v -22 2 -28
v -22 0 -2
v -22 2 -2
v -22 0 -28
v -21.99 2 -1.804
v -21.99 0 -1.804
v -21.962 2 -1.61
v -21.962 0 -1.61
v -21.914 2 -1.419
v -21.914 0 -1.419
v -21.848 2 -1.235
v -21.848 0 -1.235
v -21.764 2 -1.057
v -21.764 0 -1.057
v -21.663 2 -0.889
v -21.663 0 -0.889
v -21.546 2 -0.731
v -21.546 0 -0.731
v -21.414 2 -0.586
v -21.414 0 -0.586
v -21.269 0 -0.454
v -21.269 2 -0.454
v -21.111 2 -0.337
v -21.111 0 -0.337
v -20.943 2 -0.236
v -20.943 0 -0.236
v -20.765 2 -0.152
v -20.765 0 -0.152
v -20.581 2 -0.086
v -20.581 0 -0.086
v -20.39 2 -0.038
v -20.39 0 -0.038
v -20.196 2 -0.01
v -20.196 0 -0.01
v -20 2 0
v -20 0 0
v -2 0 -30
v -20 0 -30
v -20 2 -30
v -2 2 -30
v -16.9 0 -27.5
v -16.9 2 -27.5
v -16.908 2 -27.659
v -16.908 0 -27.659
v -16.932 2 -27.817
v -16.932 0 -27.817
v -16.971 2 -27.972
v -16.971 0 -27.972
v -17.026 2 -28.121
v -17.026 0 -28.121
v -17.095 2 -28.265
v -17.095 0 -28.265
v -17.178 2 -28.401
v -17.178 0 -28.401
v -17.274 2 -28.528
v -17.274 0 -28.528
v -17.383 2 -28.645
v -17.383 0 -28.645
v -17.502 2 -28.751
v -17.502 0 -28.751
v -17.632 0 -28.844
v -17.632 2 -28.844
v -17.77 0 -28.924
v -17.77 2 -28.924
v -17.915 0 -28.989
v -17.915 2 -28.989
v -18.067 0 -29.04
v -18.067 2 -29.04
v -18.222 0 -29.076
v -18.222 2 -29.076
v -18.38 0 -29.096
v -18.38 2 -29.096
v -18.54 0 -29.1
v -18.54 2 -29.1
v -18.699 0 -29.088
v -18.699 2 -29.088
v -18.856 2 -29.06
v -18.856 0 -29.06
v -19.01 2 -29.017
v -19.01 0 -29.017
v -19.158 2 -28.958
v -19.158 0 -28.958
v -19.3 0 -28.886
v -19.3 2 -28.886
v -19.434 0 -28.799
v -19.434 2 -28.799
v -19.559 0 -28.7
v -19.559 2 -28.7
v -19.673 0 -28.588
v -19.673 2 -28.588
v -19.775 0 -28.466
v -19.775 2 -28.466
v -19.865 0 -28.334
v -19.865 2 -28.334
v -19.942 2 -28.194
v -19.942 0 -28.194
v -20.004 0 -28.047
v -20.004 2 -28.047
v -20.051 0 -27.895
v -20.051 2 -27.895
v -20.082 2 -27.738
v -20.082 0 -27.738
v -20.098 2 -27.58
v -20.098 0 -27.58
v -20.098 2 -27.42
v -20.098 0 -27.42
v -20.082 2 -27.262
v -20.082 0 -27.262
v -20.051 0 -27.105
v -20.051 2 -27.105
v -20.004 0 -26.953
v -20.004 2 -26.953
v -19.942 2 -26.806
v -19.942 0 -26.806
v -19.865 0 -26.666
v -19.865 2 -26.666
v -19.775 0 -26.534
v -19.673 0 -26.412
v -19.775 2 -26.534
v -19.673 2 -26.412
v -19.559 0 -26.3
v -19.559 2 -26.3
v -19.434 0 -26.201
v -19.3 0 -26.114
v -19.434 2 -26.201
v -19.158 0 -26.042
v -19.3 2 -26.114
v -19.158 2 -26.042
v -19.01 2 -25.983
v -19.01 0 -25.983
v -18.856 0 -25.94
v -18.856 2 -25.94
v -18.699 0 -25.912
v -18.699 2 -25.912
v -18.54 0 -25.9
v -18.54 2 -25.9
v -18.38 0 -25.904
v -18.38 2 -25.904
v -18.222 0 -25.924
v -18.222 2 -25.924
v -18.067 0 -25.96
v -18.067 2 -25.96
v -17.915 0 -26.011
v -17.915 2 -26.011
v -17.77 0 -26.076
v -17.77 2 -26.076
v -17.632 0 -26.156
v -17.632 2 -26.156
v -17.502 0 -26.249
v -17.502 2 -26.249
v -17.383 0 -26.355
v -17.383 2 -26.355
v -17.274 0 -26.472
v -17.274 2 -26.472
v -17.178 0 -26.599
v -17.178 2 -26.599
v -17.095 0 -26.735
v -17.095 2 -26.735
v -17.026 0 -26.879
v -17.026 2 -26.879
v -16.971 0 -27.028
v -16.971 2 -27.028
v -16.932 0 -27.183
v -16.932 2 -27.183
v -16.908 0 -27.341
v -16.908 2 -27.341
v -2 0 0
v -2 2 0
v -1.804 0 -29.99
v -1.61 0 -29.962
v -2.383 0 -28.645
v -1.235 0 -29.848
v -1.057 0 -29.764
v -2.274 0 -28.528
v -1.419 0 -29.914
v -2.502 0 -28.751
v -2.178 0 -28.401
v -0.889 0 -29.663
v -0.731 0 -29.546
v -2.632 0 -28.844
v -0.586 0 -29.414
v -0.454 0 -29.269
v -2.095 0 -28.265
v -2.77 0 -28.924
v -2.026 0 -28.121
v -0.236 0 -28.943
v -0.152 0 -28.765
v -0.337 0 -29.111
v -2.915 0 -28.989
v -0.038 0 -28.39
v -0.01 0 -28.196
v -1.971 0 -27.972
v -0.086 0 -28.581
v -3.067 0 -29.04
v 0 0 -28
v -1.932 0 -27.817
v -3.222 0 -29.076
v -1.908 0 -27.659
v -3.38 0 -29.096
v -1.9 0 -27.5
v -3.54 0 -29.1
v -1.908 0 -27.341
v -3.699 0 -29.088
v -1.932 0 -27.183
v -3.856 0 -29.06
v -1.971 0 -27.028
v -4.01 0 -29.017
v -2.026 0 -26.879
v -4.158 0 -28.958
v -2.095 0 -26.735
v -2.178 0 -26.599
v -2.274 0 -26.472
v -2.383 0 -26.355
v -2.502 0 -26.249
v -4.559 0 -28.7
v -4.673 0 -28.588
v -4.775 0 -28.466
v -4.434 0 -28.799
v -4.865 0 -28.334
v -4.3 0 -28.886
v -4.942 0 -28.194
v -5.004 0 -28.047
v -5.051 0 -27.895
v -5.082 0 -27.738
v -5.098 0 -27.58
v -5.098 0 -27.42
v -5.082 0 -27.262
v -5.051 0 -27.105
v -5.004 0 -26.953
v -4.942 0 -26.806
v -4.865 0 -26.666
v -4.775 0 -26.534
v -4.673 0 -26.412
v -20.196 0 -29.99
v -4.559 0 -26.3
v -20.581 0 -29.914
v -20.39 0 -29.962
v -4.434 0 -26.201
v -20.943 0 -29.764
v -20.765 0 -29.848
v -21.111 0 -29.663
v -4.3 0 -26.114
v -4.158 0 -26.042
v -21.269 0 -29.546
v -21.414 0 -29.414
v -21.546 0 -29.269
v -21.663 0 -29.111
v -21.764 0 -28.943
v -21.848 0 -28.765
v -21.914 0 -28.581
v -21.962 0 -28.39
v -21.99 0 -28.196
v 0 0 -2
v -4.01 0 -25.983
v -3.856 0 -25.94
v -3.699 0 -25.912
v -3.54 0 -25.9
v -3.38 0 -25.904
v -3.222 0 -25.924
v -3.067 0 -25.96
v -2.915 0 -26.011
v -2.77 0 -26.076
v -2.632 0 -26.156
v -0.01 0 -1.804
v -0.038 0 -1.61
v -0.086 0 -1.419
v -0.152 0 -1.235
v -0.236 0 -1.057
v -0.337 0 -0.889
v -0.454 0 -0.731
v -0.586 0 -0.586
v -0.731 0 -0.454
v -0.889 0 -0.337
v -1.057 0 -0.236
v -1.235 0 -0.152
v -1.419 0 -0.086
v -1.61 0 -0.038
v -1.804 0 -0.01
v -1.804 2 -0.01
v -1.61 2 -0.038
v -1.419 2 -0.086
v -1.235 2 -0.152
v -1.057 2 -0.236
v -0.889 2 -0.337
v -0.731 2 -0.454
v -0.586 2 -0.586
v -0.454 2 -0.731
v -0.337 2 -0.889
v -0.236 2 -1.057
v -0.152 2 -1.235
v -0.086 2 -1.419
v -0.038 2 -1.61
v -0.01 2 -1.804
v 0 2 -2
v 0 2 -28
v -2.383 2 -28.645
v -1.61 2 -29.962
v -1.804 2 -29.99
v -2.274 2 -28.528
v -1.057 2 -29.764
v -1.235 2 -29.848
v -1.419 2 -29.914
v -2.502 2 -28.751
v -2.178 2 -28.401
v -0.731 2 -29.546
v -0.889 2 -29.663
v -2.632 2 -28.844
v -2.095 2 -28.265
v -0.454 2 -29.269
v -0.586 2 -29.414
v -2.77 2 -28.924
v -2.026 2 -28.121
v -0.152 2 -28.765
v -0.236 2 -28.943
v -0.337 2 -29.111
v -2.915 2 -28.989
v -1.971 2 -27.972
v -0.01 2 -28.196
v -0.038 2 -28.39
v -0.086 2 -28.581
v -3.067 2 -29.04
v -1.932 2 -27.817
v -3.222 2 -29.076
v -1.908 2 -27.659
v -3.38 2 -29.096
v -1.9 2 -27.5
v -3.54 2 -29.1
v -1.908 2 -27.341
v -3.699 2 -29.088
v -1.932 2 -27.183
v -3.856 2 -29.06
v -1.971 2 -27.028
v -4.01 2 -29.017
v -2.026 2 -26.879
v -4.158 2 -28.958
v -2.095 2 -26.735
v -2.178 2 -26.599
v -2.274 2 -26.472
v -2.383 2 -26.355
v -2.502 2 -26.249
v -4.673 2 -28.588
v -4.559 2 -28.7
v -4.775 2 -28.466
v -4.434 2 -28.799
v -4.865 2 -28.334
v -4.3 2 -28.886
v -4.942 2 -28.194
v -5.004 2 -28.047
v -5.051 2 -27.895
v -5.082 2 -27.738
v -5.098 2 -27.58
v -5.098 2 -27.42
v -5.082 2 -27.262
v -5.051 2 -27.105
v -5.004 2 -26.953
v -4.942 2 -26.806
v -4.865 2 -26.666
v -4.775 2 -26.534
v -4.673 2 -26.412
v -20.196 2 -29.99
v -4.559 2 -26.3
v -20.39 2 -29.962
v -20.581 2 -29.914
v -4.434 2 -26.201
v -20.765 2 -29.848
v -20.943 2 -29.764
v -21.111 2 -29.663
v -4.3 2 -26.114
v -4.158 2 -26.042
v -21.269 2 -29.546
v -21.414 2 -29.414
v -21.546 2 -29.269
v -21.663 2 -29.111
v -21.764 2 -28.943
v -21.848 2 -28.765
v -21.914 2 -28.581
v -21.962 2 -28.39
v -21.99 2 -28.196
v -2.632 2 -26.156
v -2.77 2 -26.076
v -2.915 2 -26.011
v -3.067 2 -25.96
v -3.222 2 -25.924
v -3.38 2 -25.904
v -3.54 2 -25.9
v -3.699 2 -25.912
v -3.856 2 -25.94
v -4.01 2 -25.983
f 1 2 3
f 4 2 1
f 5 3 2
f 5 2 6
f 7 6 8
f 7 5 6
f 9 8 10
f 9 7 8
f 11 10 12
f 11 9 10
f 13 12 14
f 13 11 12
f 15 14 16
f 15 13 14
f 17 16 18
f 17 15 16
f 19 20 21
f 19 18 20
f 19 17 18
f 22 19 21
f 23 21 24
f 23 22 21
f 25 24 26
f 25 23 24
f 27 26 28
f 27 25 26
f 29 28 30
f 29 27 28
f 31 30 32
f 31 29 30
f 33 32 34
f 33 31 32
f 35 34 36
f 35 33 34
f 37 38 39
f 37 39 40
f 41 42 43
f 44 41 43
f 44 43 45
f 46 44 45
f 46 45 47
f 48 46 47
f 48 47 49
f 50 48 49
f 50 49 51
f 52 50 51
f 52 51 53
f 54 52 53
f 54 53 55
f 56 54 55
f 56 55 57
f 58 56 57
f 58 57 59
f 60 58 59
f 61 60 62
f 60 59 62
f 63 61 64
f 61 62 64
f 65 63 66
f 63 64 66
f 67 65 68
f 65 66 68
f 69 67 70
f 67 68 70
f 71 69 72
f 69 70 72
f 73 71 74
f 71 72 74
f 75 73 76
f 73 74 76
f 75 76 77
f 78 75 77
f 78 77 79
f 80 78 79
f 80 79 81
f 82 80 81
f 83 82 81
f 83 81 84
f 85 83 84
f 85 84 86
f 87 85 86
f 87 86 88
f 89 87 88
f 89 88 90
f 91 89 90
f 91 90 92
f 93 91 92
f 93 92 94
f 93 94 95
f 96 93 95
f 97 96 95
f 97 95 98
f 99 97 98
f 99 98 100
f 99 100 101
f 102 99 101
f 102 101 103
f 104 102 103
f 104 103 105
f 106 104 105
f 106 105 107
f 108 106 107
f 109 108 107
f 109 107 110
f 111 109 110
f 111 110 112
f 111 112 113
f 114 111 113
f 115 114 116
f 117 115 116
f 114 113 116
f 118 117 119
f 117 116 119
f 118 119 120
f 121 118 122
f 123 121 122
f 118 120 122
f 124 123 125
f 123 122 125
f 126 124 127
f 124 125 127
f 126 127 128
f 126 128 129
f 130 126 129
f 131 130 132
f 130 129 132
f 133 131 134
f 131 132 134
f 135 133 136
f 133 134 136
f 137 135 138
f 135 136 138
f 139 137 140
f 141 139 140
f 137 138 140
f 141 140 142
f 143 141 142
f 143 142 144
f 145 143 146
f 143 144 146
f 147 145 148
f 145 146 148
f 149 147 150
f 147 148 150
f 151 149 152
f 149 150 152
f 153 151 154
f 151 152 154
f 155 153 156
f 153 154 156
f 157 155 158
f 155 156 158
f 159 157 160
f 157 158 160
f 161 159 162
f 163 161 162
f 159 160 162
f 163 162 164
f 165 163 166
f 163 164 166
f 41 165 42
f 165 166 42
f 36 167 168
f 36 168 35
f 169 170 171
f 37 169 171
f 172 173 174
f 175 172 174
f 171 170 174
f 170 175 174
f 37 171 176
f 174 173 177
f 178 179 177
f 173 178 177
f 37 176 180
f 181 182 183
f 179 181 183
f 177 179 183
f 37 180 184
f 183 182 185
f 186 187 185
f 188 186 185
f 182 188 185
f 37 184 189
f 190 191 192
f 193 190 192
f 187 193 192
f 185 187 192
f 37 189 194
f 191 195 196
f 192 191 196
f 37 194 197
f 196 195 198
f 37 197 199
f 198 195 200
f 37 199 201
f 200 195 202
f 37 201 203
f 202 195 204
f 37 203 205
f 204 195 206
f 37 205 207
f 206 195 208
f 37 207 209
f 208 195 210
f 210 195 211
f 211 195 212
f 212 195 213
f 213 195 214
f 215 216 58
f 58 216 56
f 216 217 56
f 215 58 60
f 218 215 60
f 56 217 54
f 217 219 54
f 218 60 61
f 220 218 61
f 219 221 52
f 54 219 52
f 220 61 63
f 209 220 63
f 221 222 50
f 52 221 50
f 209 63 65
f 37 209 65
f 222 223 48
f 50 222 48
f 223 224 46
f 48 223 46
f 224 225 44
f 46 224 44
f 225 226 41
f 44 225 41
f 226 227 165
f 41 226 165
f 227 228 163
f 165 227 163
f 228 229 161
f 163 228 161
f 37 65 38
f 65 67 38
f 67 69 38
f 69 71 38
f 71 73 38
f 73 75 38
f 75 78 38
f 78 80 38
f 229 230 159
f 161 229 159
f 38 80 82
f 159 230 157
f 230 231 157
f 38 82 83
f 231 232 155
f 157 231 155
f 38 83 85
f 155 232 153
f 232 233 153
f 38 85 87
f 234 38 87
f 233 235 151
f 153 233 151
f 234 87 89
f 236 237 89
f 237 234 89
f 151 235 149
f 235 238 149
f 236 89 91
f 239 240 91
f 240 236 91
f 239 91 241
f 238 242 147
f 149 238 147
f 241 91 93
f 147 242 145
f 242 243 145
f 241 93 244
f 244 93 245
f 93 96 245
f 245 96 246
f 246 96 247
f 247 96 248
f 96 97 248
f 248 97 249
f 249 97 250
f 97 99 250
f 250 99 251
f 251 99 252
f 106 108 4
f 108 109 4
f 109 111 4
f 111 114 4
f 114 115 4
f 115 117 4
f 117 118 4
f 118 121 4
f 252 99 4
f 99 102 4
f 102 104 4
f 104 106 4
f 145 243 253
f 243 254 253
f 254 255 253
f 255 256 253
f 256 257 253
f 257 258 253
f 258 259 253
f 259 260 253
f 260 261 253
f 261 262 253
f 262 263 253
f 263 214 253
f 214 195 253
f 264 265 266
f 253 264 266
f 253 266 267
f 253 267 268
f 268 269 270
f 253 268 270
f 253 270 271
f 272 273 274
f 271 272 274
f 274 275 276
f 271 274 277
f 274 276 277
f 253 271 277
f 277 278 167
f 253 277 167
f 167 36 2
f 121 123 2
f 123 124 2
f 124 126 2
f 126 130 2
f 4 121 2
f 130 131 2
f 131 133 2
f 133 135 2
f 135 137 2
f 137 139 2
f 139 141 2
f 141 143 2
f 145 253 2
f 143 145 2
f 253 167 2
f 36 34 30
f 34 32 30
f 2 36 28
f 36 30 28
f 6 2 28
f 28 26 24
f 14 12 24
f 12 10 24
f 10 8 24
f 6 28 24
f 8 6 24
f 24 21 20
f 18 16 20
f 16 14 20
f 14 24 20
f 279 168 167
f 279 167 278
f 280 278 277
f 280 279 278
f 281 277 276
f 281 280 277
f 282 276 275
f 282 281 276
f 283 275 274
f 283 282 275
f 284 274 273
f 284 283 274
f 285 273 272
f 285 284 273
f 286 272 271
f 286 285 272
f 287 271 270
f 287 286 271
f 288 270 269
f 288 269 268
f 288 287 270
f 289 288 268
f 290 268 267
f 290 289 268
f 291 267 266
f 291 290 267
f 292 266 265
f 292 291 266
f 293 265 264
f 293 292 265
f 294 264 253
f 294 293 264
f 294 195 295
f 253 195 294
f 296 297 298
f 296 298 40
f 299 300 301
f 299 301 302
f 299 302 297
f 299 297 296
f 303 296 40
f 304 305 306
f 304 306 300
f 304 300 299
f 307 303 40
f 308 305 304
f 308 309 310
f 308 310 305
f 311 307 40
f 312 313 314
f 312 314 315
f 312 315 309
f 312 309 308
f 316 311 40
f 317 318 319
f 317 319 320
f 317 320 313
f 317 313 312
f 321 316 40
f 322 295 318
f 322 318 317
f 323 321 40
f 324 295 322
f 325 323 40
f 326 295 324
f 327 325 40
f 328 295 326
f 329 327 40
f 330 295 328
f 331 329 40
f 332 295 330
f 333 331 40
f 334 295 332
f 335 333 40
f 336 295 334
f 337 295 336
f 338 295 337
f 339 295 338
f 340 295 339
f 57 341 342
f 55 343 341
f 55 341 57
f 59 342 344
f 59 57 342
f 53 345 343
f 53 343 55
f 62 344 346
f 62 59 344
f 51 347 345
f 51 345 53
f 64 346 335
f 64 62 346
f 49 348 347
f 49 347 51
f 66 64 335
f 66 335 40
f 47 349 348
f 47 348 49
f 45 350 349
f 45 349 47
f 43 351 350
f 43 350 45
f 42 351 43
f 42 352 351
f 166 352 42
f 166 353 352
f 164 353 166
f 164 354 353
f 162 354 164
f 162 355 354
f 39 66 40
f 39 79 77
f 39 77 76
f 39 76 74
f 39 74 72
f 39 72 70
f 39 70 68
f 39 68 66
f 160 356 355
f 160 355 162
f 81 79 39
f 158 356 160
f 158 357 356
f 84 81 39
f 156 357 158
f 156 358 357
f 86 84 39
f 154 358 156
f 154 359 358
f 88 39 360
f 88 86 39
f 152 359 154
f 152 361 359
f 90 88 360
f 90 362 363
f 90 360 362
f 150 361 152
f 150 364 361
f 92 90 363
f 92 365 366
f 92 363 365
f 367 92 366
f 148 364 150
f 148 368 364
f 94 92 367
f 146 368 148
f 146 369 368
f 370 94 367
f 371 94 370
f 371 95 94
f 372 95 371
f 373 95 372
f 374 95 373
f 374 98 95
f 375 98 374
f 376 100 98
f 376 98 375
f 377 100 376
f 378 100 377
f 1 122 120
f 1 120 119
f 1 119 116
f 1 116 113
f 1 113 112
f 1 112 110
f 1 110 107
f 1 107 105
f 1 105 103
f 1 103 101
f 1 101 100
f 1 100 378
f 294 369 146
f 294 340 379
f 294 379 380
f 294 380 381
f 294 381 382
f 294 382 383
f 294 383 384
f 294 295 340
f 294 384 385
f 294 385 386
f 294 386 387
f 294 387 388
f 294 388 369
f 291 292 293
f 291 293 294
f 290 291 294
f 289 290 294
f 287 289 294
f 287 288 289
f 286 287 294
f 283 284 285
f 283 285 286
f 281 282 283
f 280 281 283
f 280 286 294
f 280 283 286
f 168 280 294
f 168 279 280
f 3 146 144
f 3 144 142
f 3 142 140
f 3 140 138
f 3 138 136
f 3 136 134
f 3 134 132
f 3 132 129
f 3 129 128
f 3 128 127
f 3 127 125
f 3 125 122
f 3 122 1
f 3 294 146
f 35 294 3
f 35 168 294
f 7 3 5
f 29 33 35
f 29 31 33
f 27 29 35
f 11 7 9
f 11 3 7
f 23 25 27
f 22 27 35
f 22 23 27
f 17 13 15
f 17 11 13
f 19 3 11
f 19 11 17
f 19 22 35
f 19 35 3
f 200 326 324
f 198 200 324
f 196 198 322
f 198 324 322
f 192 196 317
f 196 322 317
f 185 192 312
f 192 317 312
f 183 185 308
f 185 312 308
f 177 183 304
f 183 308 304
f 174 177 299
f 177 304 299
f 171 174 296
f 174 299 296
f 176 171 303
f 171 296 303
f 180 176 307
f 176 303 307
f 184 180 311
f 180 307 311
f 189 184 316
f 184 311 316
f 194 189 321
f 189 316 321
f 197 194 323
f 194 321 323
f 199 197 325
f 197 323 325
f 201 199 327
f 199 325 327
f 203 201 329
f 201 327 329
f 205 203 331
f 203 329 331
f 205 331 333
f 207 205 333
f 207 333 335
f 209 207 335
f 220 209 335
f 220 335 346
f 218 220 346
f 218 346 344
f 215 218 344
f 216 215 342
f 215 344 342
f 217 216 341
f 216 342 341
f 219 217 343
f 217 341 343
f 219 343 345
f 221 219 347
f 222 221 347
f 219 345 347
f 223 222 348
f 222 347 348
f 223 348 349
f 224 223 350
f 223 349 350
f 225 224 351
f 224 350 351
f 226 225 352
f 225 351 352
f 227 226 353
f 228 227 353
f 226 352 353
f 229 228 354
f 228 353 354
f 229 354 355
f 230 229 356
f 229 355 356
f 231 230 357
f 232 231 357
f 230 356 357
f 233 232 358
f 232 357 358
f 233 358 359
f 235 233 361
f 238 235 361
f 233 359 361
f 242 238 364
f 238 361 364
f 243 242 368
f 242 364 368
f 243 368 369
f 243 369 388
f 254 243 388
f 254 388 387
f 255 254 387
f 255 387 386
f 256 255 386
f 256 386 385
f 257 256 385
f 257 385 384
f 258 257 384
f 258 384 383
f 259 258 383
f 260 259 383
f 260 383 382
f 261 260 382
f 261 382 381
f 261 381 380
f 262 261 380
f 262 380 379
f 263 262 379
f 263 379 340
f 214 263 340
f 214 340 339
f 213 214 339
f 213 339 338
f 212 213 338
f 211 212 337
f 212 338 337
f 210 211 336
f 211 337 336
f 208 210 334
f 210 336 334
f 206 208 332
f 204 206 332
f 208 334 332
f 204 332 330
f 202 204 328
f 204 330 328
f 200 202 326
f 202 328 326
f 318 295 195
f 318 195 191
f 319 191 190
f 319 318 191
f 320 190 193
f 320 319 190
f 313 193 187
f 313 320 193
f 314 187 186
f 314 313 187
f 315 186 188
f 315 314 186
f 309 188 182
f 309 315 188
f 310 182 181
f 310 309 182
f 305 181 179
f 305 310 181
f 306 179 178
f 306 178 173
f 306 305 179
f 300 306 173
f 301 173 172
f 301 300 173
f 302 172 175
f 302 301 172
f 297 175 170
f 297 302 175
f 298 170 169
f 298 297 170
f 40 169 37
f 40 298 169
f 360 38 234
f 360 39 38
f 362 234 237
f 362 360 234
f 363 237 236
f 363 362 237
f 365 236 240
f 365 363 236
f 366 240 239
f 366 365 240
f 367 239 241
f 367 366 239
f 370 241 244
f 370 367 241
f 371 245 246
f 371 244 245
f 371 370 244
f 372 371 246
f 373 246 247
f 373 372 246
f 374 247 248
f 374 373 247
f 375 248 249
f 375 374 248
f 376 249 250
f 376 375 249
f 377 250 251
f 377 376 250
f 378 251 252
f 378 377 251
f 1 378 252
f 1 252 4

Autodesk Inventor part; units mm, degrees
ref_plane "YZ Plane" through (0, 0, 0) normal (1, 0, 0) x (0, 1, 0)
ref_plane "XZ Plane" through (0, 0, 0) normal (0, 1, 0) x (-1, 0, 0)
ref_plane "XY Plane" through (0, 0, 0) normal (0, 0, 1) x (1, 0, 0)
sketch "Esquisse1" plane through (0, 0, 0) normal (0, 1, 0) x (-1, 0, 0)
  line L0 (0, 0) -> (22, 0)
  line L1 (22, 0) -> (22, -30)
  line L2 (22, -30) -> (0, -30)
  line L3 (0, -30) -> (0, 0)
  dimension "d0" = 22
  dimension "d1" = 30
extrude "Extrusion1" add sketch "Esquisse1" along normal blind 2
sketch "Esquisse2" plane through (0, 2, 0) normal (0, 1, 0) x (1, 0, 0)
  line L0 (0, 30) -> (-22, 30) projected
  line L1 (-11, 30) -> (-3.5, 30)
  line L2 (-11, 30) -> (-18.5, 30)
  line L3 (-18.5, 30) -> (-18.5, 27.5)
  line L4 (-3.5, 30) -> (-3.5, 27.5)
  circle A0 centre (-18.5, 27.5) radius 1.6
  circle A1 centre (-3.5, 27.5) radius 1.6
  point P0 (0, 0)
  dimension "d4" = 7.5
  dimension "d5" = 7.5
  dimension "d6" = 2.5
  dimension "d7" = 2.5
  dimension "d8" = 3.2
  dimension "d9" = 3.2
extrude "Extrusion2" cut sketch "Esquisse2" against normal through all
fillet "Congé1" radius 2 4 edges at (0, 1, -30) (-22, 1, -30) (0, 1, 0) (-22, 1, 0)
properties part number "DFR0440"
